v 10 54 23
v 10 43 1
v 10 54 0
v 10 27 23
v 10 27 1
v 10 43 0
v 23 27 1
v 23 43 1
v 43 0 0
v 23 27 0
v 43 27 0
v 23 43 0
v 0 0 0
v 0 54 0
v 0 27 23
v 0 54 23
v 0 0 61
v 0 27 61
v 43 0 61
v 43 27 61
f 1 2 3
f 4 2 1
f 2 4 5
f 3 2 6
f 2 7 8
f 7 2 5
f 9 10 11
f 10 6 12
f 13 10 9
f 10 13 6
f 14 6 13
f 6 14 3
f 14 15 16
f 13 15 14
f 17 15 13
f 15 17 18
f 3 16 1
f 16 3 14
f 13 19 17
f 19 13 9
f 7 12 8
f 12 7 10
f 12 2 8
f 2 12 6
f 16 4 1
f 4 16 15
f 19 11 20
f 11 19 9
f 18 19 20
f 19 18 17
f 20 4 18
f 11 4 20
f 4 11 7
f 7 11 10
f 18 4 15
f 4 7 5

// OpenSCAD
//sample string
sample2="10,54 23,43";
sample3="10,54,23 43,27,61";

each_element(sample2, "usb");
each_element(sample3, "usb");

module each_element( input_arr, type )
{
	input = [" ", input_arr, " "];
	result = search(" ", strcat(input), 8);
	//echo(result);
	for ( i = [0:len(result[0])-2] )
	{
		if (len(search(",",substr(input_arr,result[0][i],result[0][i+1]-result[0][i]-1),8)[0]) == 1)
		{
			assign( input2 = [",",substr(input_arr,result[0][i],result[0][i+1]-result[0][i]-1),"," ] )
			scan_string_two( strcat(input2), type );
		}
		if (len(search(",",substr(input_arr,result[0][i],result[0][i+1]-result[0][i]-1),8)[0]) == 2)
		{
			assign( input2 = [",",substr(input_arr,result[0][i],result[0][i+1]-result[0][i]-1),"," ] )
			scan_string_three( strcat(input2), type );
		}
	}
}

module scan_string_two( input_string, type )
{
	result = search(",", input_string,8);
	for ( i = [ 0:2:len(result[0])-2 ] )
	{	
		assign( first = strToInt(substr(substr(input_string,result[0][i],result[0][i+1]-result[0][i]),1,len(substr(input_string,result[0][i],result[0][i+1]-result[0][i]))-1)),
		second = strToInt(substr(substr(input_string,result[0][i+1],result[0][i+2]-result[0][i+1]),1,len(substr(input_string,result[0][i+1],result[0][i+2]-result[0][i+1]))-1)),
		third = 1 )
		call_type( type, first, second, third );
	}
}

module scan_string_three( input_string, type )
{
	result = search(",", input_string,8);
	//echo( len(result[0]));
	for ( i = [ 0:3:len(result[0])-3 ] )
	{	
		//echo(result[0][i+1]-result[0][i]);
		//echo(strToInt(substr(substr(input_string,result[0][i],result[0][i+1]-result[0][i]),1,len(substr(input_string,result[0][i],result[0][i+1]-result[0][i]))-1)));
		//echo(strToInt(substr(substr(input_string,result[0][i+1],result[0][i+2]-result[0][i+1]),1,len(substr(input_string,result[0][i+1],result[0][i+2]-result[0][i+1]))-1)));
		//echo(strToInt(substr(substr(input_string,result[0][i+2],result[0][i+3]-result[0][i+2]),1,len(substr(input_string,result[0][i+2],result[0][i+3]-result[0][i+2]))-1)));
		assign( first = strToInt(substr(substr(input_string,result[0][i],result[0][i+1]-result[0][i]),1,len(substr(input_string,result[0][i],result[0][i+1]-result[0][i]))-1)),
		second = strToInt(substr(substr(input_string,result[0][i+1],result[0][i+2]-result[0][i+1]),1,len(substr(input_string,result[0][i+1],result[0][i+2]-result[0][i+1]))-1)),
		third = strToInt(substr(substr(input_string,result[0][i+2],result[0][i+3]-result[0][i+2]),1,len(substr(input_string,result[0][i+2],result[0][i+3]-result[0][i+2]))-1)) )
		call_type( type, first, second, third );
	}
}


module call_type ( type, first, second, third )
{
	if ( type == "usb" )
	{
		cube( [ first, second, third ] );
	}
}


//openscad string library
//http://www.thingiverse.com/thing:202724
function strToInt(str, base=10, i=0, nb=0) = (str[0] == "-") ? -1*_strToInt(str, base, 1) : _strToInt(str, base);
function _strToInt(str, base, i=0, nb=0) = (i == len(str)) ? nb : nb+_strToInt(str, base, i+1, search(str[i],"0123456789ABCDEF")[0]*pow(base,len(str)-i-1));

function substr(data, i, length=0) = (length == 0) ? _substr(data, i, len(data)) : _substr(data, i, length+i);
function _substr(str, i, j, out="") = (i==j) ? out : str(str[i], _substr(str, i+1, j, out));

function strcat(v, car="") = _strcat(v, len(v)-1, car, 0);
function _strcat(v, i, car, s) = (i==s ? v[i] : str(_strcat(v, i-1, car, s), str(car,v[i]) ));
